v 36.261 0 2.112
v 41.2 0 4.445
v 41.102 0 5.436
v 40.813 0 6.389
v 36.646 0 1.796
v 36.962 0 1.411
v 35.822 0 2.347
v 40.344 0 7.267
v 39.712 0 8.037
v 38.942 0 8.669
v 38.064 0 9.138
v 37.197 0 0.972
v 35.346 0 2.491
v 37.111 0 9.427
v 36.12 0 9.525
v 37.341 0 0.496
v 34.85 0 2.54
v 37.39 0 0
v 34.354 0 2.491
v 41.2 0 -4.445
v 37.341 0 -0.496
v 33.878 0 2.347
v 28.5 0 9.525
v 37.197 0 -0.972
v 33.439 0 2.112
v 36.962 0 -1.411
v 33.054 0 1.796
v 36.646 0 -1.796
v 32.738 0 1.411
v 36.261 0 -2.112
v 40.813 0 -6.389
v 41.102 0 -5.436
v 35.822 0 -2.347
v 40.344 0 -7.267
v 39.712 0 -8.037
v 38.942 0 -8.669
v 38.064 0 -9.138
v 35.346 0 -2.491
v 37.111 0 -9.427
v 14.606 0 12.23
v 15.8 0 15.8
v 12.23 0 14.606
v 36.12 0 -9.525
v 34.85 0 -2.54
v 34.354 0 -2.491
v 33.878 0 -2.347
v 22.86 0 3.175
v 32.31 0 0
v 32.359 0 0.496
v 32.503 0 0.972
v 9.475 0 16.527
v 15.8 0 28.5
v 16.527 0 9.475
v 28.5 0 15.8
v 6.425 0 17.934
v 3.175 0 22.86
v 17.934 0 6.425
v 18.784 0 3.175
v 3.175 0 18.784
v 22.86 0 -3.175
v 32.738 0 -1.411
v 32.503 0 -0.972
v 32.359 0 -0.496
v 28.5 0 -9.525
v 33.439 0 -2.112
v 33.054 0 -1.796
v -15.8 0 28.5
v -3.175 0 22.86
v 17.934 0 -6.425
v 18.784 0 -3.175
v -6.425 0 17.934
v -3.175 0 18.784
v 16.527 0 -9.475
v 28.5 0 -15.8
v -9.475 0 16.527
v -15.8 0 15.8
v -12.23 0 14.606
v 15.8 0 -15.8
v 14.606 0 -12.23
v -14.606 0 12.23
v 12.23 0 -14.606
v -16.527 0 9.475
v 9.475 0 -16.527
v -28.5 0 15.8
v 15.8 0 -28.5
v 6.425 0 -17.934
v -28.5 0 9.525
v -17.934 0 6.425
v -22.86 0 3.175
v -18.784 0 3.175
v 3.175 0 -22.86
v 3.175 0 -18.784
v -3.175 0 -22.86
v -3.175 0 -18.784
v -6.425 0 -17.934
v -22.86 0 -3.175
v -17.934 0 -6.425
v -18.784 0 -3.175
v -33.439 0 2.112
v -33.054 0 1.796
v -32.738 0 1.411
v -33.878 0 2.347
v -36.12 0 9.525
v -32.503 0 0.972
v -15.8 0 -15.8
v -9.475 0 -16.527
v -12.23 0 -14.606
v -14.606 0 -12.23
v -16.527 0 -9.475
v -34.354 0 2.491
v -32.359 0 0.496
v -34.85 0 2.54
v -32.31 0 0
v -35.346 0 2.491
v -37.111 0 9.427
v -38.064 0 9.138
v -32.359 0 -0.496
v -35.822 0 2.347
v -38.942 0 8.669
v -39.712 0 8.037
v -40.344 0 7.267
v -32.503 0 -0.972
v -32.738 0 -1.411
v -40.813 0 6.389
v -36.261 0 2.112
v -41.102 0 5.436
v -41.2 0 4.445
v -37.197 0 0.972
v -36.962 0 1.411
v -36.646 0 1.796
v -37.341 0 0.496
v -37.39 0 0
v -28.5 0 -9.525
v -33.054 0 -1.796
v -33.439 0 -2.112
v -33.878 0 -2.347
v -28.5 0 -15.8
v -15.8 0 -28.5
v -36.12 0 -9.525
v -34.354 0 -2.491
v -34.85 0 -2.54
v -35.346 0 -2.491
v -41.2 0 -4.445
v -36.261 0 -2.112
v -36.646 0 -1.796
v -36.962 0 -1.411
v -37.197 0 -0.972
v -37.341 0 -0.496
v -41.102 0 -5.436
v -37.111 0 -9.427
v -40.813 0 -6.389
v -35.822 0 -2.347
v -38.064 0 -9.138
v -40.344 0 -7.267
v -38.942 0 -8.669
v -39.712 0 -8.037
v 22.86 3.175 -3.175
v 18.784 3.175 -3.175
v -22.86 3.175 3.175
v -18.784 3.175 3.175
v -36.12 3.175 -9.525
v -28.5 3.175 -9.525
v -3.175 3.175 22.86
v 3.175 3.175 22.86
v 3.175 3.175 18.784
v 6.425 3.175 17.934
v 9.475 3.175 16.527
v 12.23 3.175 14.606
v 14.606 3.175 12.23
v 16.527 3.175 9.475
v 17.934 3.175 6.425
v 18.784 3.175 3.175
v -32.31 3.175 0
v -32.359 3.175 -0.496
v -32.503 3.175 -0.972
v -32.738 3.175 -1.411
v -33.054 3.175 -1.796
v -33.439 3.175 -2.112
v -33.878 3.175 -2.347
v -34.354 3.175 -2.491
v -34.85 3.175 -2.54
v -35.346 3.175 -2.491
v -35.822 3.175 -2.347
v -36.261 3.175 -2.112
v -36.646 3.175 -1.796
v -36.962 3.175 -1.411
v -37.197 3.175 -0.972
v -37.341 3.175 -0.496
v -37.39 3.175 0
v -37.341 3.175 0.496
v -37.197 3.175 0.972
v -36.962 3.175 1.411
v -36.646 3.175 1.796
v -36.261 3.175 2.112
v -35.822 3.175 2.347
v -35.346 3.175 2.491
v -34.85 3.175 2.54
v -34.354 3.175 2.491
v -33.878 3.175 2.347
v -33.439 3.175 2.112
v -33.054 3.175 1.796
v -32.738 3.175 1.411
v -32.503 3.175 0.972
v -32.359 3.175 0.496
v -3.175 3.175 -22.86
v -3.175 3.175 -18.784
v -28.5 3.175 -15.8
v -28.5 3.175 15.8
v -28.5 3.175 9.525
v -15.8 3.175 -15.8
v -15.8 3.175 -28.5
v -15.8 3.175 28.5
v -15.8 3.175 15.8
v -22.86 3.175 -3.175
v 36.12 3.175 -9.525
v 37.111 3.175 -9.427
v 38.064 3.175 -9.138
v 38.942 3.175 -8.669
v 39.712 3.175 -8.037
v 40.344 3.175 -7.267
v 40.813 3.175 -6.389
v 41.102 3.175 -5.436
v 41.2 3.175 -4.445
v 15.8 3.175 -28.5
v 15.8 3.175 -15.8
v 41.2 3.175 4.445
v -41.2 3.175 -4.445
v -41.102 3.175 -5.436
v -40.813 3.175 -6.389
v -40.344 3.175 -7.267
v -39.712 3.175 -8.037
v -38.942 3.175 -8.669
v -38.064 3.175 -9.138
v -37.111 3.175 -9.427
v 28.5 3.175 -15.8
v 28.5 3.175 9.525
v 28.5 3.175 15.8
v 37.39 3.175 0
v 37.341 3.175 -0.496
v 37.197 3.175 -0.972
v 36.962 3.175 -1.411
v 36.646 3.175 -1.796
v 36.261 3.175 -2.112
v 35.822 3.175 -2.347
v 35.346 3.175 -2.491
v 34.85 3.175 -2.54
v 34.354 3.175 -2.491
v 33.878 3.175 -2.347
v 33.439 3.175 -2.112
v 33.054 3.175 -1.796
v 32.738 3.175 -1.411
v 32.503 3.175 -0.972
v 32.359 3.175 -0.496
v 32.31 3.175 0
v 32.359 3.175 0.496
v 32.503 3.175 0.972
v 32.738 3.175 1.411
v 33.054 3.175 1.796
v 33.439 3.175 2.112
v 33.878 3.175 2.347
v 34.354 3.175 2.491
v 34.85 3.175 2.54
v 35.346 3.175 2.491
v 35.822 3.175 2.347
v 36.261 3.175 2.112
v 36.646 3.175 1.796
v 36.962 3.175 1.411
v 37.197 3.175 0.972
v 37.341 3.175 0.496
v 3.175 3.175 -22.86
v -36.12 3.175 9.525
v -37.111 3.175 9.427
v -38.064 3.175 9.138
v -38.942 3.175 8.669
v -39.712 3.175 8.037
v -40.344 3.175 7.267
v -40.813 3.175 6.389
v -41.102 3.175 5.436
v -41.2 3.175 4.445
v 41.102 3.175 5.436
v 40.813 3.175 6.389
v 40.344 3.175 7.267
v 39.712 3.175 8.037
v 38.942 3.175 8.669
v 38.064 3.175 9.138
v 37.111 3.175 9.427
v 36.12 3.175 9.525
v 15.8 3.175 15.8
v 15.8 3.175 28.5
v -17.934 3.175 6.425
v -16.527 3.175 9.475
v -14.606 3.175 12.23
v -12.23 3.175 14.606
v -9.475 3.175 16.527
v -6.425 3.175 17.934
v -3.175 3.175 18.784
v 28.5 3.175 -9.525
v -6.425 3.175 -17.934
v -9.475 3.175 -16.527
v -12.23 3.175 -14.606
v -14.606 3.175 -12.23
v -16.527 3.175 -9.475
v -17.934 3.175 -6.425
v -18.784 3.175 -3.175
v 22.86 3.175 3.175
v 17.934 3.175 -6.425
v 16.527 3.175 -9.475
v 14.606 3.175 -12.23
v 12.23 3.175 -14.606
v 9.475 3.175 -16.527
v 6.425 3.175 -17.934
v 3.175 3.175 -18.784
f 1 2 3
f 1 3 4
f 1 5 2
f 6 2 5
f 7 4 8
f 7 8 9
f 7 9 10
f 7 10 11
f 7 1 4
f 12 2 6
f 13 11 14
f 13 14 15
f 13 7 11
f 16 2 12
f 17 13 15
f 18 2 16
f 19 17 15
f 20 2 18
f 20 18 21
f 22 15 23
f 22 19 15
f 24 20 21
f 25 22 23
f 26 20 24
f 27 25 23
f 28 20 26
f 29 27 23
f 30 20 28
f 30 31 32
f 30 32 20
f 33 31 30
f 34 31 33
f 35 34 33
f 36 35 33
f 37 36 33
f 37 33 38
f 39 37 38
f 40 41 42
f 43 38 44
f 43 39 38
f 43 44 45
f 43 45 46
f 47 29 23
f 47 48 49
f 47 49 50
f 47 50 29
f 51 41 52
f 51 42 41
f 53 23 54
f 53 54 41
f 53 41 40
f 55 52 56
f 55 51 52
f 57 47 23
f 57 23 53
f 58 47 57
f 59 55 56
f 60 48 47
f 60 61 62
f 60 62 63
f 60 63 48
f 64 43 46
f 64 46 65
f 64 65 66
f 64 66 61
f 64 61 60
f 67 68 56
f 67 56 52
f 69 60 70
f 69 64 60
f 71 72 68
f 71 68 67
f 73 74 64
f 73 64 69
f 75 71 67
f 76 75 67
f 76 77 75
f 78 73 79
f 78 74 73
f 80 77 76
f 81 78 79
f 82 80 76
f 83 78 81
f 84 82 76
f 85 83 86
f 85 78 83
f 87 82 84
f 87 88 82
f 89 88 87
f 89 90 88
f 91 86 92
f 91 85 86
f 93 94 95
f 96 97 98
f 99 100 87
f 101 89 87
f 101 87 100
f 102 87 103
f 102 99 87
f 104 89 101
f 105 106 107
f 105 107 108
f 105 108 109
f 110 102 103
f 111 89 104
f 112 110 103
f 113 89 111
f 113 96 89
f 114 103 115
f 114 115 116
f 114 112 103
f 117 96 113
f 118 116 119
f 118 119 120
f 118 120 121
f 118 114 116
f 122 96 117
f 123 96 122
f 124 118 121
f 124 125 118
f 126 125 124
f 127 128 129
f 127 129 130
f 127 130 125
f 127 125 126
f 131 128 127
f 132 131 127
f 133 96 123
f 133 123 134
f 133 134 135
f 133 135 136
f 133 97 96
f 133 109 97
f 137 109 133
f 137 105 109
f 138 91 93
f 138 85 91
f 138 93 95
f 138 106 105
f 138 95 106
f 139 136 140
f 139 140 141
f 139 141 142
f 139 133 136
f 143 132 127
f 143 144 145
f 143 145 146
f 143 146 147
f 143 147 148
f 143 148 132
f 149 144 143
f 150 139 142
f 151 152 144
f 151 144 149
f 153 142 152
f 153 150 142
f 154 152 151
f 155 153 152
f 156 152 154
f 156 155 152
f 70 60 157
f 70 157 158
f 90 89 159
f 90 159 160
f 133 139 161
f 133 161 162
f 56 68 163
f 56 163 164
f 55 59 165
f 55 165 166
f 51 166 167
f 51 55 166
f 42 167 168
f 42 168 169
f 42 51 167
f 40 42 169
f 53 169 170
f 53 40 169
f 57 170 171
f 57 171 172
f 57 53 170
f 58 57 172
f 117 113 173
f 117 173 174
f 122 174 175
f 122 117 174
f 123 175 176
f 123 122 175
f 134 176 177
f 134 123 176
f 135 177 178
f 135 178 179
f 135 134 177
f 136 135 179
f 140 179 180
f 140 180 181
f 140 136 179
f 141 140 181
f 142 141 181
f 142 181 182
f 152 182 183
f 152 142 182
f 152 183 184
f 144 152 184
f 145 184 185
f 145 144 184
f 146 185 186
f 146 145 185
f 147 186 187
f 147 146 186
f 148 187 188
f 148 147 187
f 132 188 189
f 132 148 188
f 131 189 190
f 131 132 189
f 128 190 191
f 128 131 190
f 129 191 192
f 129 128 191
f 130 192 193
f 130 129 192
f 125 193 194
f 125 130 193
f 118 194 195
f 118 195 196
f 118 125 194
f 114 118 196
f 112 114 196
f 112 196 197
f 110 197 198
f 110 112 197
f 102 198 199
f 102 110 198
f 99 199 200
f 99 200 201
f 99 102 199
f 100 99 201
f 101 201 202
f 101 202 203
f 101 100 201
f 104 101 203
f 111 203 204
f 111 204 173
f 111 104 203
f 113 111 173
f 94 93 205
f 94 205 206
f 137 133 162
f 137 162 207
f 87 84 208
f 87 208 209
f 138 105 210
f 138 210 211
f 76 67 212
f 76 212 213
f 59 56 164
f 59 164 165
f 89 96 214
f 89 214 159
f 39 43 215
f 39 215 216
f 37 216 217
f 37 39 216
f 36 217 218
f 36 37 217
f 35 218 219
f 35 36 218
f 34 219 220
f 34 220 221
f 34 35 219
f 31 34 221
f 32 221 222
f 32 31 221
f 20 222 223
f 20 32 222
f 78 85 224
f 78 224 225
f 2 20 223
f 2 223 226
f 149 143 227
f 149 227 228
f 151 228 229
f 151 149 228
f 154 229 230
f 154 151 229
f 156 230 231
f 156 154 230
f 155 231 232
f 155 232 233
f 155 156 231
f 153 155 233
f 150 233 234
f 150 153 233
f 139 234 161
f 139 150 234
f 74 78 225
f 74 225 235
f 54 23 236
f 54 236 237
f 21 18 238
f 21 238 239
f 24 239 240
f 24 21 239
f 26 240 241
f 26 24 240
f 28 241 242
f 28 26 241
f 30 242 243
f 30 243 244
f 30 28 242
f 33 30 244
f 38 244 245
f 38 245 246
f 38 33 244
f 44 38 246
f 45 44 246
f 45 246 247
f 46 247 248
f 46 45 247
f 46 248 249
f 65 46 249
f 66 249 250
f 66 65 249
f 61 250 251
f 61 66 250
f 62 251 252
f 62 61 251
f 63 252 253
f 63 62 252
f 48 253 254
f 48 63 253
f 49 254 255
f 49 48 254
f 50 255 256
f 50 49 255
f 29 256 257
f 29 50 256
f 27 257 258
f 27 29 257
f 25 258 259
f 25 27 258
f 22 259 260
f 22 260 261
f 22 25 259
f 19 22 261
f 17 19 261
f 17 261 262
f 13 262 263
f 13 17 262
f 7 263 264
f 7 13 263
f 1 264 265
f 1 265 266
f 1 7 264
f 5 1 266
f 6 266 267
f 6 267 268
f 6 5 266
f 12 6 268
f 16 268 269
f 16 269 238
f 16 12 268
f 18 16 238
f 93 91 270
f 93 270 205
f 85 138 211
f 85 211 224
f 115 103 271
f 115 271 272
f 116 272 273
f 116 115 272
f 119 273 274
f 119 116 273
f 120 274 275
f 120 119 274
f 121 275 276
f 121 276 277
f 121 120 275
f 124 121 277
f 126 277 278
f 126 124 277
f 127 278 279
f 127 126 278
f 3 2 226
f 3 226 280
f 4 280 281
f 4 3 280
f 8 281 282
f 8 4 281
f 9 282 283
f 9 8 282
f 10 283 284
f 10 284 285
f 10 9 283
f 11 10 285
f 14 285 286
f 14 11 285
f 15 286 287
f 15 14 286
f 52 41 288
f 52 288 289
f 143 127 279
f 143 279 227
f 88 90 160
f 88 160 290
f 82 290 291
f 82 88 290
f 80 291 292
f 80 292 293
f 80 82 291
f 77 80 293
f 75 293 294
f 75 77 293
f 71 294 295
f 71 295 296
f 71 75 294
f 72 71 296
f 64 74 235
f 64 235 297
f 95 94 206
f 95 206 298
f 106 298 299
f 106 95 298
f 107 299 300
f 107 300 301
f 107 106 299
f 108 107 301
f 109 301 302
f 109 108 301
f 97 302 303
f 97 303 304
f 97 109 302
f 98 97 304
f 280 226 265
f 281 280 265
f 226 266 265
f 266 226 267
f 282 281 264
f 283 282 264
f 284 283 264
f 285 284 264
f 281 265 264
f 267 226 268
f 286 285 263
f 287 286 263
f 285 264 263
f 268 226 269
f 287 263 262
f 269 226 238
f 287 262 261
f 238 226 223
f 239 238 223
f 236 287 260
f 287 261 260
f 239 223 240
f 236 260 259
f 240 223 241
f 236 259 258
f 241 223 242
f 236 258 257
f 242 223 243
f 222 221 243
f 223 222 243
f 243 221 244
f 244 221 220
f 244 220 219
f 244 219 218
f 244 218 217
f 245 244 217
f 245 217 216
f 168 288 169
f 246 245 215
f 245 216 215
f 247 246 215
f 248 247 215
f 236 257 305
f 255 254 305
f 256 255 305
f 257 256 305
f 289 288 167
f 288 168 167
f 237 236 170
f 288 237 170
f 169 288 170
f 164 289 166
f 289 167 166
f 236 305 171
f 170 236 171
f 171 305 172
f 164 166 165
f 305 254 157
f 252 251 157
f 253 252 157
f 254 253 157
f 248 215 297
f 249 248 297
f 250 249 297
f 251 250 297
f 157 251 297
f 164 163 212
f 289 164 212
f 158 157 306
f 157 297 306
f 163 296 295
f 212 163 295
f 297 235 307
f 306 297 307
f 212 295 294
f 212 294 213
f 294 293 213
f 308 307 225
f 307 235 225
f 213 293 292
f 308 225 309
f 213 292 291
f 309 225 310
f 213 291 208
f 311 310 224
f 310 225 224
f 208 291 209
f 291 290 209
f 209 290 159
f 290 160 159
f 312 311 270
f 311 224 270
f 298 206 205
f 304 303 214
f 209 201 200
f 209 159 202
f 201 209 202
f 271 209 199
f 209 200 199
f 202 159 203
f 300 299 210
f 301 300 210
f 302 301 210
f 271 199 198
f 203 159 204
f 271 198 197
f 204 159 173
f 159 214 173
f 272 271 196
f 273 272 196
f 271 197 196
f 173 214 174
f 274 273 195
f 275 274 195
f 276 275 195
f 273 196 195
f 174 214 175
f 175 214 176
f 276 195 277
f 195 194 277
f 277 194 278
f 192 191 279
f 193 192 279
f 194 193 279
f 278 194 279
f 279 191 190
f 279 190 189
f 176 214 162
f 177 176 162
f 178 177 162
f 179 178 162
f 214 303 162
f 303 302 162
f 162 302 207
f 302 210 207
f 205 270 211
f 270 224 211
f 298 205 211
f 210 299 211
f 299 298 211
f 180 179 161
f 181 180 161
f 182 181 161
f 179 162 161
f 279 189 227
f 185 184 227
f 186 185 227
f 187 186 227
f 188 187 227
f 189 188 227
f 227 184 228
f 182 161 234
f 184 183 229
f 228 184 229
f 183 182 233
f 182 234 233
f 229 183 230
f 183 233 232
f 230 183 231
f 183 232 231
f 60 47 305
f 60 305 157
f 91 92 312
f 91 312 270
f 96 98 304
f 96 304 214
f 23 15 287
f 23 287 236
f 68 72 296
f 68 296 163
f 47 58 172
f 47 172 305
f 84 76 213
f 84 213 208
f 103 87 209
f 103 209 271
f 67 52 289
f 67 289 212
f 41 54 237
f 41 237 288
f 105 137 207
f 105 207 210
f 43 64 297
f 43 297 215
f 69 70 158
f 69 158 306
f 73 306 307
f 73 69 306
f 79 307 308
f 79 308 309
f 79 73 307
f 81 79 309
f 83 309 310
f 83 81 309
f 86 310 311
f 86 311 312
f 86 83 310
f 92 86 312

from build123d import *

# Parameters (mm, degrees)
SKETCH1_R           = 2.54
BOSS_EXTRUDE1_DEPTH = 3.175


with BuildPart() as part:
    # Sketch1 → Boss-Extrude1 (new body)
    with BuildSketch(Plane(origin=(0, 0, 0), x_dir=(1, 0, 0), z_dir=(0, 1, 0))):
        with BuildLine():
            Line((15.7999938, -28.4999938), (-15.7999938, -28.4999938))
            Line((-15.7999938, -28.4999938), (-15.7999938, -15.7999938))
            Line((-15.7999938, -15.7999938), (-28.4999938, -15.7999938))
            Line((-28.4999938, -15.7999938), (-28.4999938, -9.525))
            Line((-28.4999938, -9.525), (-36.1199938, -9.525))
            ThreePointArc((-36.1199938, -9.525), (-39.712096248, -8.037102448), (-41.1999938, -4.445))
            Line((-41.1999938, -4.445), (-41.1999938, 4.445))
            ThreePointArc((-41.1999938, 4.445), (-39.712096248, 8.037102448), (-36.1199938, 9.525))
            Line((-36.1199938, 9.525), (-28.4999938, 9.525))
            Line((-28.4999938, 9.525), (-28.4999938, 15.7999938))
            Line((-28.4999938, 15.7999938), (-15.7999938, 15.7999938))
            Line((-15.7999938, 15.7999938), (-15.7999938, 28.4999938))
            Line((-15.7999938, 28.4999938), (15.7999938, 28.4999938))
            Line((15.7999938, 28.4999938), (15.7999938, 15.7999938))
            Line((15.7999938, 15.7999938), (28.4999938, 15.7999938))
            Line((28.4999938, 15.7999938), (28.4999938, 9.525))
            Line((28.4999938, 9.525), (36.1199938, 9.525))
            ThreePointArc((36.1199938, 9.525), (39.712096248, 8.037102448), (41.1999938, 4.445))
            Line((41.1999938, 4.445), (41.1999938, -4.445))
            ThreePointArc((41.1999938, -4.445), (39.712096248, -8.037102448), (36.1199938, -9.525))
            Line((36.1199938, -9.525), (28.4999938, -9.525))
            Line((28.4999938, -9.525), (28.4999938, -15.7999938))
            Line((28.4999938, -15.7999938), (15.7999938, -15.7999938))
            Line((15.7999938, -15.7999938), (15.7999938, -28.4999938))
        make_face()
        with Locations((-34.8499938, 0)):
            Circle(SKETCH1_R, mode=Mode.SUBTRACT)
        with Locations((34.8499938, 0)):
            Circle(SKETCH1_R, mode=Mode.SUBTRACT)
        with BuildLine():
            Line((-18.783553311, 3.175), (-22.86, 3.175))
            Line((-22.86, 3.175), (-22.86, -3.175))
            Line((-22.86, -3.175), (-18.783553311, -3.175))
            ThreePointArc((-18.783553311, -3.175), (-13.470384182, -13.470384182), (-3.175, -18.783553311))
            Line((-3.175, -18.783553311), (-3.175, -22.86))
            Line((-3.175, -22.86), (3.175, -22.86))
            Line((3.175, -22.86), (3.175, -18.783553311))
            ThreePointArc((3.175, -18.783553311), (13.470384182, -13.470384182), (18.783553311, -3.175))
            Line((18.783553311, -3.175), (22.86, -3.175))
            Line((22.86, -3.175), (22.86, 3.175))
            Line((22.86, 3.175), (18.783553311, 3.175))
            ThreePointArc((18.783553311, 3.175), (13.470384182, 13.470384182), (3.175, 18.783553311))
            Line((3.175, 18.783553311), (3.175, 22.86))
            Line((3.175, 22.86), (-3.175, 22.86))
            Line((-3.175, 22.86), (-3.175, 18.783553311))
            ThreePointArc((-3.175, 18.783553311), (-13.470384182, 13.470384182), (-18.783553311, 3.175))
        make_face(mode=Mode.SUBTRACT)
    extrude(amount=BOSS_EXTRUDE1_DEPTH)


solid = part.part
